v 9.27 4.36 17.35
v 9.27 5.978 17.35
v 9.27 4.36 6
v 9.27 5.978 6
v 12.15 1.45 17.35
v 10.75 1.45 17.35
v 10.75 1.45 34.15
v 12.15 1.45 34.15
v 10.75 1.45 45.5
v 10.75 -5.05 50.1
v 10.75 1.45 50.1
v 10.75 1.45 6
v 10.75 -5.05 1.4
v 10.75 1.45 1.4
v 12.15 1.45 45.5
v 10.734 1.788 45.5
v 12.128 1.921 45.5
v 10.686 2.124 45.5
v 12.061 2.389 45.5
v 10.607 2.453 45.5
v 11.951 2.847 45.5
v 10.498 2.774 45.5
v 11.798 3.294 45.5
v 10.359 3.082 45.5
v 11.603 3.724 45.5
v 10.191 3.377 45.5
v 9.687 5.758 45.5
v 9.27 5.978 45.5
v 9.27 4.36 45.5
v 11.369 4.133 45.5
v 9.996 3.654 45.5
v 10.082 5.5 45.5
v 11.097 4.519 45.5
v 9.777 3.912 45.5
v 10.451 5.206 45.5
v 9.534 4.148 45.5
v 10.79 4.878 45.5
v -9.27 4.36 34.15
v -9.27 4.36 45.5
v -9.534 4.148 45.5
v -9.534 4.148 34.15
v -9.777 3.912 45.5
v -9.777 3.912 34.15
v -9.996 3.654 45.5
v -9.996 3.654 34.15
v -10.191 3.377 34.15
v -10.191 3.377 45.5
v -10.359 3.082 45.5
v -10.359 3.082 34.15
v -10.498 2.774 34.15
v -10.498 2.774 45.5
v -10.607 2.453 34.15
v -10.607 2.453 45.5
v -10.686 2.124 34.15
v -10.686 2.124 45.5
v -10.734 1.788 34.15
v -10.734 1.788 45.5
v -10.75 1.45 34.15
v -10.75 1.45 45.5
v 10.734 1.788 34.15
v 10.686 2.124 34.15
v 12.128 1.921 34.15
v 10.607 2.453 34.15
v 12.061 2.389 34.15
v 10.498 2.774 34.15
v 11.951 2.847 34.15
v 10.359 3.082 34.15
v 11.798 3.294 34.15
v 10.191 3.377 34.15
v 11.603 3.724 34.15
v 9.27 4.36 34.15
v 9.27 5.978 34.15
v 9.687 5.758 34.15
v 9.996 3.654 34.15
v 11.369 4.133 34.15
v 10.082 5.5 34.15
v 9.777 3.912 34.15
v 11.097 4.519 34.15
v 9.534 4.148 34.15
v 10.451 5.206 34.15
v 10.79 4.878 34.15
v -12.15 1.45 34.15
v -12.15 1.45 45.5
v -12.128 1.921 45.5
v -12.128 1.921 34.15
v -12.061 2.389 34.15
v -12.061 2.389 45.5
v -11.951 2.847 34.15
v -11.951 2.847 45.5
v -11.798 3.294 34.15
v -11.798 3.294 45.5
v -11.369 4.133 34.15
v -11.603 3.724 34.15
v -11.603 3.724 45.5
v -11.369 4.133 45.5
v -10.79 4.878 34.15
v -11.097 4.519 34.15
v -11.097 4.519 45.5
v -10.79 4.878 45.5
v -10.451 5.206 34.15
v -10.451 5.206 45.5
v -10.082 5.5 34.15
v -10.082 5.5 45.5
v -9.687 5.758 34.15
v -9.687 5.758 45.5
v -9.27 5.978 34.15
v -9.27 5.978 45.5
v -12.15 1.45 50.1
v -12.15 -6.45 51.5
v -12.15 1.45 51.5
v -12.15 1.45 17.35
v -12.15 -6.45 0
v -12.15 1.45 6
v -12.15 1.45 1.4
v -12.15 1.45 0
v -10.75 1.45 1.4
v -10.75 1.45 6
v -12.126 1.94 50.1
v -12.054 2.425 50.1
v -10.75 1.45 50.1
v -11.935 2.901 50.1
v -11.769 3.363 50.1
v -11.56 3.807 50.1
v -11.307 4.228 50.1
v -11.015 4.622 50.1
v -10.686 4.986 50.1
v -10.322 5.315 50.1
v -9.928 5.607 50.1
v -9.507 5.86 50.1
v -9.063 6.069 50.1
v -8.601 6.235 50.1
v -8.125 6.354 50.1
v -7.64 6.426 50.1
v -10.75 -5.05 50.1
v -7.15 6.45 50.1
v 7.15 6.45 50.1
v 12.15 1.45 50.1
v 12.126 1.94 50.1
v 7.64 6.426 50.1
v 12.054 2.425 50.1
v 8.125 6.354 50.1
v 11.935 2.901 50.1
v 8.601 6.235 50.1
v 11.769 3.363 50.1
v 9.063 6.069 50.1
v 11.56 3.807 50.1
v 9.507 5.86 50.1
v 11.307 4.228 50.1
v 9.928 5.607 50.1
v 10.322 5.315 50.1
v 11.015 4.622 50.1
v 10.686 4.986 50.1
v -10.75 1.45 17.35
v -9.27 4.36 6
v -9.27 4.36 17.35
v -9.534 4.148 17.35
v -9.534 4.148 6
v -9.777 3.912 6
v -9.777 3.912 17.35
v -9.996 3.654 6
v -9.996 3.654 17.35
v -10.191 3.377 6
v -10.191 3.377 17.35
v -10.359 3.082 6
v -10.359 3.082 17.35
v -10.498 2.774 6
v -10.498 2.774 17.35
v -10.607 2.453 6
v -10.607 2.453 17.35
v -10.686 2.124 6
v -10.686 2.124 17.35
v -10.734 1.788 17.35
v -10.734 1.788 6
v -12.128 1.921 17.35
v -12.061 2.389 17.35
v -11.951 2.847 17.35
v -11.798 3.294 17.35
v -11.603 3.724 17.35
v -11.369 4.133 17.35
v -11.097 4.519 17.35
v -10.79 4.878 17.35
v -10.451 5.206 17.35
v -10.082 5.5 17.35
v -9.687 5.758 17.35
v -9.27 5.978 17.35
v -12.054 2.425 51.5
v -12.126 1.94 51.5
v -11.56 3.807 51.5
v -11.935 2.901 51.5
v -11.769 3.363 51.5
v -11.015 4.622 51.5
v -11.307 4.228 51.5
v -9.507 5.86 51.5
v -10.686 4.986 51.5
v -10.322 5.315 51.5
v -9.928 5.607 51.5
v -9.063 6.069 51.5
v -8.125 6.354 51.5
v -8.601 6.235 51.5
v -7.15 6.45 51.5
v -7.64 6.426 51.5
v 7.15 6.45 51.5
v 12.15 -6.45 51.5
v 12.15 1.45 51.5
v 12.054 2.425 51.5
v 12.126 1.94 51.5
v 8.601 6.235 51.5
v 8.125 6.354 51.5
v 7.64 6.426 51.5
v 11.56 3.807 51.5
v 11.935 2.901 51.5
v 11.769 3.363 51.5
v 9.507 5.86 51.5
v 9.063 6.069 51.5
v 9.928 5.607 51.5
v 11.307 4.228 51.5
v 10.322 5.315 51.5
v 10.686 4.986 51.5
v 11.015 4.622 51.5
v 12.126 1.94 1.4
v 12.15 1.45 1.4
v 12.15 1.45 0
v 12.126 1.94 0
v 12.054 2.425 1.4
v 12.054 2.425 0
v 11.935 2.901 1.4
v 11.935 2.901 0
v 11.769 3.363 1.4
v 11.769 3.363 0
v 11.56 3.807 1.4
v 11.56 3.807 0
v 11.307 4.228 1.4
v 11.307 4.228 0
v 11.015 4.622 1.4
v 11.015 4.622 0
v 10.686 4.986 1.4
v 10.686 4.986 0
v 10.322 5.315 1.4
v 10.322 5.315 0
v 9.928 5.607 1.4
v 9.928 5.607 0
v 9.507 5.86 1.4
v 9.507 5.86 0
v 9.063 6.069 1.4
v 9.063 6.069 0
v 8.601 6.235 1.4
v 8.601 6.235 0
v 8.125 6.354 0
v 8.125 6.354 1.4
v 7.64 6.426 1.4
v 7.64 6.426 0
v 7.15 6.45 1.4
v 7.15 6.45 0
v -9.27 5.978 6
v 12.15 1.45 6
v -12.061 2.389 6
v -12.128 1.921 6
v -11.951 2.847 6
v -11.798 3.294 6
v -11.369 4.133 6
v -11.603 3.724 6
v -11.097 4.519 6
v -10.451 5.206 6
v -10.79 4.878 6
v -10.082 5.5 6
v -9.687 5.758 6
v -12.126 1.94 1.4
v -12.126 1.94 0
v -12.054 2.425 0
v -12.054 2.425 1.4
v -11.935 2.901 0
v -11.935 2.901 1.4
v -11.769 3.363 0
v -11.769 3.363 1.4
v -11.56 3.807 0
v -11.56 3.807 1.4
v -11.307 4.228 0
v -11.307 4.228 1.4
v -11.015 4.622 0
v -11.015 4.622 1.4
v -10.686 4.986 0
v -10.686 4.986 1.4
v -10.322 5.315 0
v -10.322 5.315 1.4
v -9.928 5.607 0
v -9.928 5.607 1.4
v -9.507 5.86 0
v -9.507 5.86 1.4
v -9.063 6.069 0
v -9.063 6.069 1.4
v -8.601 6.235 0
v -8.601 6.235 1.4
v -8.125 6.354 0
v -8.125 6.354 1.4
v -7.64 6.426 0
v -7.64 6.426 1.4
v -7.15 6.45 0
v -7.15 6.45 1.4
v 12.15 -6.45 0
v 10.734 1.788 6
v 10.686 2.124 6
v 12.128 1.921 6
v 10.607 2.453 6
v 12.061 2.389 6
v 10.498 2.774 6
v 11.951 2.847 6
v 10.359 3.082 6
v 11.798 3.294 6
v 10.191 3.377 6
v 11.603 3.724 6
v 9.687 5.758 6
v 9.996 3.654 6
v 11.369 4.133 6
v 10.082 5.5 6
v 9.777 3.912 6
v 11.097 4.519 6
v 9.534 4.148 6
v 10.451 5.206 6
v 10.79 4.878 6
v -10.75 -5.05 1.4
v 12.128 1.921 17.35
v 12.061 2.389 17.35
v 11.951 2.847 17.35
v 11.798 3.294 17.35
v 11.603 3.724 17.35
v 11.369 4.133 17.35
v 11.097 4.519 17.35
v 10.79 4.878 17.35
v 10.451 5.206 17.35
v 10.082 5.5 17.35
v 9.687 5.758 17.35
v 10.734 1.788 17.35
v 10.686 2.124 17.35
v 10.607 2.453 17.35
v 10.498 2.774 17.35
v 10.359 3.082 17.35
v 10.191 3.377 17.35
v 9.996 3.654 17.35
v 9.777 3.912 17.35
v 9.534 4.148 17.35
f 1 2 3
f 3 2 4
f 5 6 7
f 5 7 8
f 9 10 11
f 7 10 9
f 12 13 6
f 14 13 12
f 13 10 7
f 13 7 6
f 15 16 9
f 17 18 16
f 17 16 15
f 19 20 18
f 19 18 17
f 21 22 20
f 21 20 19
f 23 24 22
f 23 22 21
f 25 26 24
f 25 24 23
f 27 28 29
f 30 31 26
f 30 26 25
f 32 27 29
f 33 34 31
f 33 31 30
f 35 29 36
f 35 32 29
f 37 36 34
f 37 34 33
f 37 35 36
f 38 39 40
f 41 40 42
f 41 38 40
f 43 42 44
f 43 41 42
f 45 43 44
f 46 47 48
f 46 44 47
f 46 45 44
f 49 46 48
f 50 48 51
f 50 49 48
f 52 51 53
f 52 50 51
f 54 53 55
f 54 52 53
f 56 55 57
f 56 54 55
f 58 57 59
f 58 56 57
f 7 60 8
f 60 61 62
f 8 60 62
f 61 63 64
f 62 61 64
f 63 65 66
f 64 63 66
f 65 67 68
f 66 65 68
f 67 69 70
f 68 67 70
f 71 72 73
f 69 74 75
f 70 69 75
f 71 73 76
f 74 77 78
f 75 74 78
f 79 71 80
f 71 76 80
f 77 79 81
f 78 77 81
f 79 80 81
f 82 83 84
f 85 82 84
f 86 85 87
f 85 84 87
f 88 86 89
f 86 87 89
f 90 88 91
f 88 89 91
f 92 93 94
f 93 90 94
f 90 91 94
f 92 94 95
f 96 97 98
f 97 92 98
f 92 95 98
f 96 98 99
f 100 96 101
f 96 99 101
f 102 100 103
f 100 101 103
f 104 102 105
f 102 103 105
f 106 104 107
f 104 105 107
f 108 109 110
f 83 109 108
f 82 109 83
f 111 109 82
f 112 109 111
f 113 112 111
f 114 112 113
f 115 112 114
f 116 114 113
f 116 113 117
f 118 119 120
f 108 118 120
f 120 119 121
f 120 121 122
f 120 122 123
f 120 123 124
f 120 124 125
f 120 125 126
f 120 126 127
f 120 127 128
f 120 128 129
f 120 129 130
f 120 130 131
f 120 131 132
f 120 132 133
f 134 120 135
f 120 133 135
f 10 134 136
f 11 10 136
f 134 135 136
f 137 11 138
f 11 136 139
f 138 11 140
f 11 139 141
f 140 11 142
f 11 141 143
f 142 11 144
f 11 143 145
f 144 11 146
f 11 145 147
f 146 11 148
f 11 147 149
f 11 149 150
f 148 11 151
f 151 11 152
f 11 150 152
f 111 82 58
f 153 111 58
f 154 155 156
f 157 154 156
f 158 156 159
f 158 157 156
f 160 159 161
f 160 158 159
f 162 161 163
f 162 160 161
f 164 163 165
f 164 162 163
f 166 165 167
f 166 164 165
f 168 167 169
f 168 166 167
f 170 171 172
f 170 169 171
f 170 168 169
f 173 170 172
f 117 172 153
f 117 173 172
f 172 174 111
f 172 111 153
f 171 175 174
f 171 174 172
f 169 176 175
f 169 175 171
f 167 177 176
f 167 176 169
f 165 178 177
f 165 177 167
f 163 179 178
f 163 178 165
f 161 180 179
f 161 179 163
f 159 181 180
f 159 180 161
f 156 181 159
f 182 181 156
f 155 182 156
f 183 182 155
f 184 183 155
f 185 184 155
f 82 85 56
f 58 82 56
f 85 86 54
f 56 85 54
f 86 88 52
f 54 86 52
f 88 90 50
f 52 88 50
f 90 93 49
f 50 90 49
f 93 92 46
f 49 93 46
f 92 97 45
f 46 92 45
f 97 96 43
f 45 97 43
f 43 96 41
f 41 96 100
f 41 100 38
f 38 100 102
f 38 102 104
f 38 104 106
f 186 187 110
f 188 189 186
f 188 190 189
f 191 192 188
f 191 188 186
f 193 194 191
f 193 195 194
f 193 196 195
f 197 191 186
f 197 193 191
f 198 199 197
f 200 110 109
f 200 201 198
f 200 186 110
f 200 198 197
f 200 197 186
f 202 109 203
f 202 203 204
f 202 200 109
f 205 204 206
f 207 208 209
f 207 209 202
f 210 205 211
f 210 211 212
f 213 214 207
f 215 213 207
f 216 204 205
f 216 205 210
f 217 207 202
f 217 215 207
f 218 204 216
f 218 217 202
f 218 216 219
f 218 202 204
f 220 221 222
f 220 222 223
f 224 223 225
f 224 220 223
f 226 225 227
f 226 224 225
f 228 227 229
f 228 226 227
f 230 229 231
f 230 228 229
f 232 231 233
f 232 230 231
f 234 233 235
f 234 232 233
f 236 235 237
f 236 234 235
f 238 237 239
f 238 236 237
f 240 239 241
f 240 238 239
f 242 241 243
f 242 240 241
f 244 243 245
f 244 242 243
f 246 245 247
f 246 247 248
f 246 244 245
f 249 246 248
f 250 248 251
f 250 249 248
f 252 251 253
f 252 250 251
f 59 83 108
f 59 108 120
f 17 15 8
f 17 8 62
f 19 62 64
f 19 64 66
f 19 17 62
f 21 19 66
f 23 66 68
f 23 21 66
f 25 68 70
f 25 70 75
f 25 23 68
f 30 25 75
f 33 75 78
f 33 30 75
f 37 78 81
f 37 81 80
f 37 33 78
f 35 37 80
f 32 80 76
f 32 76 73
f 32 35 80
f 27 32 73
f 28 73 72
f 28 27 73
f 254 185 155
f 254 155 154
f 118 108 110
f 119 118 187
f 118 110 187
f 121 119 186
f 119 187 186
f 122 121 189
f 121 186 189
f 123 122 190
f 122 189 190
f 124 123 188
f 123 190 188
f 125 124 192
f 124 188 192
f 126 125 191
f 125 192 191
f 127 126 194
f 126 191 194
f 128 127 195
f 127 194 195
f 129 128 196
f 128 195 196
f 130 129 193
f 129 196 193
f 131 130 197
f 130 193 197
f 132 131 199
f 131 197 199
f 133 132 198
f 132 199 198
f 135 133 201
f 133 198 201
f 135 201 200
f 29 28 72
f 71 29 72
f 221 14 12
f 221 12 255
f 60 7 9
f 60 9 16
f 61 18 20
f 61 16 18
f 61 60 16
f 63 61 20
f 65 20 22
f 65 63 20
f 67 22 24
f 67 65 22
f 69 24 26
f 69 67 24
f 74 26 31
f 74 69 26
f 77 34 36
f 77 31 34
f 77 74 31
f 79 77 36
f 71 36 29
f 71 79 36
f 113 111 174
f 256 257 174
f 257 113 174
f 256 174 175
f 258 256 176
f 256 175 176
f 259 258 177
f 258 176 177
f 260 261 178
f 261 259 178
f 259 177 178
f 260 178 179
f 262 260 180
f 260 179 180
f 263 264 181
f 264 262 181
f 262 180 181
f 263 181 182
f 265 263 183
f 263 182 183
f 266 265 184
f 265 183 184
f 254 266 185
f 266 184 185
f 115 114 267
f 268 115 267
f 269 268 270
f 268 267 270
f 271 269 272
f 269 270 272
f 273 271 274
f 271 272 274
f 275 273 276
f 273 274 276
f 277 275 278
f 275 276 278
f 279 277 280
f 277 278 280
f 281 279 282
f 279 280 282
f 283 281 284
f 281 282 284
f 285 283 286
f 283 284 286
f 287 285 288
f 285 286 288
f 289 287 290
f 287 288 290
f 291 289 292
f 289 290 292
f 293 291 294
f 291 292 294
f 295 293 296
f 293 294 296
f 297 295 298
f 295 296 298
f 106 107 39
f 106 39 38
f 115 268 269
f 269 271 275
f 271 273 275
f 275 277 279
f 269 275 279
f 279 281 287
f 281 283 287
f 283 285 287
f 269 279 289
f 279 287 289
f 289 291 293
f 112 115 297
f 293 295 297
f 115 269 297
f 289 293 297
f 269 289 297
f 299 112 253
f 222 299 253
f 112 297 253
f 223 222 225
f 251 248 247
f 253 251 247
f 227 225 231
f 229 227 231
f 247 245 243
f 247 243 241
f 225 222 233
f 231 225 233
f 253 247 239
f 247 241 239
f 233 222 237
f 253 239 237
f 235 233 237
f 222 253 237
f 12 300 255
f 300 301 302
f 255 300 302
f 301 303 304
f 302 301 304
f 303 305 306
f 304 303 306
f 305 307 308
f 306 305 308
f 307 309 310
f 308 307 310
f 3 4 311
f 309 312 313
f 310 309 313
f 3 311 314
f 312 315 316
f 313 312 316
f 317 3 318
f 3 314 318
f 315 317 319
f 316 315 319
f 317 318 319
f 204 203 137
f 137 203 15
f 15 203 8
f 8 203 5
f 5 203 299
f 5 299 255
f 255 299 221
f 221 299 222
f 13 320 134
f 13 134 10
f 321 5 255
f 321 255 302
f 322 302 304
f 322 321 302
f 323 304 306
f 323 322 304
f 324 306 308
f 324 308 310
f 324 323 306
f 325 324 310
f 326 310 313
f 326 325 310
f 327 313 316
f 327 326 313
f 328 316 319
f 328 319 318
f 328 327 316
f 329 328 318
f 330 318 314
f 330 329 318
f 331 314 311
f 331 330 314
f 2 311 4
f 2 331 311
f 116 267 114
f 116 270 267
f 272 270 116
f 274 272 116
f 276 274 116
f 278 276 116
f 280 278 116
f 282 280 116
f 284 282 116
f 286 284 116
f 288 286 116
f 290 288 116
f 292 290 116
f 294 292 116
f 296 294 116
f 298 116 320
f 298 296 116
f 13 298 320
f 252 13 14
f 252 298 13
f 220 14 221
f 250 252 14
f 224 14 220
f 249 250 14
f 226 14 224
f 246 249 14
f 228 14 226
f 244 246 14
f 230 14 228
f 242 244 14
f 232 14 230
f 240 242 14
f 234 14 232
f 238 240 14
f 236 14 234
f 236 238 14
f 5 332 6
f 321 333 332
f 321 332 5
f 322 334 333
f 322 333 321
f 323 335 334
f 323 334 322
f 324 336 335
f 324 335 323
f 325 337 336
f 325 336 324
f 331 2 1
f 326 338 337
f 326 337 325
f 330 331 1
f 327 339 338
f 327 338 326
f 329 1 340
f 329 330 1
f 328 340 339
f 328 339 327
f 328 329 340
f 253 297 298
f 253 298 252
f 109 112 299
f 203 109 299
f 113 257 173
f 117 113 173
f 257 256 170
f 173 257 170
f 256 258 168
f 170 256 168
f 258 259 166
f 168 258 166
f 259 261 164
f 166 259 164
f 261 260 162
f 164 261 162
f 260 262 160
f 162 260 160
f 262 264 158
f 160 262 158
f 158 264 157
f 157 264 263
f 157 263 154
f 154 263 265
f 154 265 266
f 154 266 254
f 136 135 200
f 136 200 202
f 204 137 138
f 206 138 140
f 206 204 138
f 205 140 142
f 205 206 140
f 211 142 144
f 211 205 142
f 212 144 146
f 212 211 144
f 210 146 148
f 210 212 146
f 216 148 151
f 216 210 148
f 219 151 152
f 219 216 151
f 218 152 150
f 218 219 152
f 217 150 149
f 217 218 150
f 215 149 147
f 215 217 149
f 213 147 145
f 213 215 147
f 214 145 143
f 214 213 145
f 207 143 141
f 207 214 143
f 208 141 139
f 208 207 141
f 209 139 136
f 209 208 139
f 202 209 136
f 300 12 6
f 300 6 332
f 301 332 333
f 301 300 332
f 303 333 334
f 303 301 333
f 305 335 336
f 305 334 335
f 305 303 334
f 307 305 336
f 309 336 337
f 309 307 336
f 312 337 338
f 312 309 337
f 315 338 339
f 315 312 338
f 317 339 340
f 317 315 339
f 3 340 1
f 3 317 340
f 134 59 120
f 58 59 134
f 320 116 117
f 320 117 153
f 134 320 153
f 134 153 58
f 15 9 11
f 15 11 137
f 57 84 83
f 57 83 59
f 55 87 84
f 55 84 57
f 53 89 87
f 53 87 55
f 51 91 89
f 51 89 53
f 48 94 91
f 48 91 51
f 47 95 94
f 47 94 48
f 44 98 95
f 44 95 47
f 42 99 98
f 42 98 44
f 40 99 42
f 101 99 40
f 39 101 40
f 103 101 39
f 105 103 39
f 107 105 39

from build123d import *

# Parameters (mm, degrees)
SKETCH1_W           = 24.3
SKETCH1_H           = 12.9
BOSS_EXTRUDE1_DEPTH = 51.5
FILLET1_R           = 5
SHELL1_START        = 1.4
SHELL1_DEPTH        = 48.7
SKETCH2_W           = 18.539285396
SKETCH2_H           = 48.7
CUT_EXTRUDE1_DEPTH  = 5
SKETCH3_W           = 24.3
SKETCH3_H           = 4.6
SKETCH3_H_2         = 16.8
CUT_EXTRUDE2_DEPTH  = 5


# Read off the part's stored shape, not the designer's step: Shell1
with BuildPart() as part:
    # Sketch1 → Boss-Extrude1 (new body)
    with BuildSketch(Plane.XY):
        Rectangle(SKETCH1_W, SKETCH1_H)
    extrude(amount=BOSS_EXTRUDE1_DEPTH)

    # Fillet1
    fillet1_edges = [part.edges().sort_by_distance(p)[0] for p in [
        (-12.15, 6.45, 25.75),
        (12.15, 6.45, 25.75),
    ]]
    fillet(fillet1_edges, radius=FILLET1_R)

    # Shell1 outline → Shell1 (cut)
    with BuildSketch(Plane.XY.offset(SHELL1_START)):
        with BuildLine():
            Line((7.15, 5.05), (7.15, 6.45))
            Line((7.15, 6.45), (-7.15, 6.45))
            Line((-7.15, 6.45), (-7.15, 5.05))
            ThreePointArc((-7.15, 5.05), (-9.695584412, 3.995584412), (-10.75, 1.45))
            Line((-10.75, 1.45), (-10.75, -5.05))
            Line((-10.75, -5.05), (10.75, -5.05))
            Line((10.75, -5.05), (10.75, 1.45))
            ThreePointArc((10.75, 1.45), (9.695584412, 3.995584412), (7.15, 5.05))
        make_face()
    extrude(amount=SHELL1_DEPTH, mode=Mode.SUBTRACT)

    # Sketch2 → Cut-Extrude1 (cut)
    with BuildSketch(Plane(origin=(0, 6.45, 0), x_dir=(1, 0, 0), z_dir=(0, 1, 0))):
        with Locations((0, -25.75)):
            Rectangle(SKETCH2_W, SKETCH2_H)
    extrude(amount=-CUT_EXTRUDE1_DEPTH, mode=Mode.SUBTRACT)

    # Sketch3 → Cut-Extrude2 (cut)
    with BuildSketch(Plane(origin=(0, 6.45, 0), x_dir=(1, 0, 0), z_dir=(0, 1, 0))):
        with Locations((0, -3.7)):
            Rectangle(SKETCH3_W, SKETCH3_H)
        with Locations((0, -47.8)):
            Rectangle(SKETCH3_W, SKETCH3_H)
        with Locations((0, -25.75)):
            Rectangle(SKETCH3_W, SKETCH3_H_2)
    extrude(amount=-CUT_EXTRUDE2_DEPTH, mode=Mode.SUBTRACT)


solid = part.part
